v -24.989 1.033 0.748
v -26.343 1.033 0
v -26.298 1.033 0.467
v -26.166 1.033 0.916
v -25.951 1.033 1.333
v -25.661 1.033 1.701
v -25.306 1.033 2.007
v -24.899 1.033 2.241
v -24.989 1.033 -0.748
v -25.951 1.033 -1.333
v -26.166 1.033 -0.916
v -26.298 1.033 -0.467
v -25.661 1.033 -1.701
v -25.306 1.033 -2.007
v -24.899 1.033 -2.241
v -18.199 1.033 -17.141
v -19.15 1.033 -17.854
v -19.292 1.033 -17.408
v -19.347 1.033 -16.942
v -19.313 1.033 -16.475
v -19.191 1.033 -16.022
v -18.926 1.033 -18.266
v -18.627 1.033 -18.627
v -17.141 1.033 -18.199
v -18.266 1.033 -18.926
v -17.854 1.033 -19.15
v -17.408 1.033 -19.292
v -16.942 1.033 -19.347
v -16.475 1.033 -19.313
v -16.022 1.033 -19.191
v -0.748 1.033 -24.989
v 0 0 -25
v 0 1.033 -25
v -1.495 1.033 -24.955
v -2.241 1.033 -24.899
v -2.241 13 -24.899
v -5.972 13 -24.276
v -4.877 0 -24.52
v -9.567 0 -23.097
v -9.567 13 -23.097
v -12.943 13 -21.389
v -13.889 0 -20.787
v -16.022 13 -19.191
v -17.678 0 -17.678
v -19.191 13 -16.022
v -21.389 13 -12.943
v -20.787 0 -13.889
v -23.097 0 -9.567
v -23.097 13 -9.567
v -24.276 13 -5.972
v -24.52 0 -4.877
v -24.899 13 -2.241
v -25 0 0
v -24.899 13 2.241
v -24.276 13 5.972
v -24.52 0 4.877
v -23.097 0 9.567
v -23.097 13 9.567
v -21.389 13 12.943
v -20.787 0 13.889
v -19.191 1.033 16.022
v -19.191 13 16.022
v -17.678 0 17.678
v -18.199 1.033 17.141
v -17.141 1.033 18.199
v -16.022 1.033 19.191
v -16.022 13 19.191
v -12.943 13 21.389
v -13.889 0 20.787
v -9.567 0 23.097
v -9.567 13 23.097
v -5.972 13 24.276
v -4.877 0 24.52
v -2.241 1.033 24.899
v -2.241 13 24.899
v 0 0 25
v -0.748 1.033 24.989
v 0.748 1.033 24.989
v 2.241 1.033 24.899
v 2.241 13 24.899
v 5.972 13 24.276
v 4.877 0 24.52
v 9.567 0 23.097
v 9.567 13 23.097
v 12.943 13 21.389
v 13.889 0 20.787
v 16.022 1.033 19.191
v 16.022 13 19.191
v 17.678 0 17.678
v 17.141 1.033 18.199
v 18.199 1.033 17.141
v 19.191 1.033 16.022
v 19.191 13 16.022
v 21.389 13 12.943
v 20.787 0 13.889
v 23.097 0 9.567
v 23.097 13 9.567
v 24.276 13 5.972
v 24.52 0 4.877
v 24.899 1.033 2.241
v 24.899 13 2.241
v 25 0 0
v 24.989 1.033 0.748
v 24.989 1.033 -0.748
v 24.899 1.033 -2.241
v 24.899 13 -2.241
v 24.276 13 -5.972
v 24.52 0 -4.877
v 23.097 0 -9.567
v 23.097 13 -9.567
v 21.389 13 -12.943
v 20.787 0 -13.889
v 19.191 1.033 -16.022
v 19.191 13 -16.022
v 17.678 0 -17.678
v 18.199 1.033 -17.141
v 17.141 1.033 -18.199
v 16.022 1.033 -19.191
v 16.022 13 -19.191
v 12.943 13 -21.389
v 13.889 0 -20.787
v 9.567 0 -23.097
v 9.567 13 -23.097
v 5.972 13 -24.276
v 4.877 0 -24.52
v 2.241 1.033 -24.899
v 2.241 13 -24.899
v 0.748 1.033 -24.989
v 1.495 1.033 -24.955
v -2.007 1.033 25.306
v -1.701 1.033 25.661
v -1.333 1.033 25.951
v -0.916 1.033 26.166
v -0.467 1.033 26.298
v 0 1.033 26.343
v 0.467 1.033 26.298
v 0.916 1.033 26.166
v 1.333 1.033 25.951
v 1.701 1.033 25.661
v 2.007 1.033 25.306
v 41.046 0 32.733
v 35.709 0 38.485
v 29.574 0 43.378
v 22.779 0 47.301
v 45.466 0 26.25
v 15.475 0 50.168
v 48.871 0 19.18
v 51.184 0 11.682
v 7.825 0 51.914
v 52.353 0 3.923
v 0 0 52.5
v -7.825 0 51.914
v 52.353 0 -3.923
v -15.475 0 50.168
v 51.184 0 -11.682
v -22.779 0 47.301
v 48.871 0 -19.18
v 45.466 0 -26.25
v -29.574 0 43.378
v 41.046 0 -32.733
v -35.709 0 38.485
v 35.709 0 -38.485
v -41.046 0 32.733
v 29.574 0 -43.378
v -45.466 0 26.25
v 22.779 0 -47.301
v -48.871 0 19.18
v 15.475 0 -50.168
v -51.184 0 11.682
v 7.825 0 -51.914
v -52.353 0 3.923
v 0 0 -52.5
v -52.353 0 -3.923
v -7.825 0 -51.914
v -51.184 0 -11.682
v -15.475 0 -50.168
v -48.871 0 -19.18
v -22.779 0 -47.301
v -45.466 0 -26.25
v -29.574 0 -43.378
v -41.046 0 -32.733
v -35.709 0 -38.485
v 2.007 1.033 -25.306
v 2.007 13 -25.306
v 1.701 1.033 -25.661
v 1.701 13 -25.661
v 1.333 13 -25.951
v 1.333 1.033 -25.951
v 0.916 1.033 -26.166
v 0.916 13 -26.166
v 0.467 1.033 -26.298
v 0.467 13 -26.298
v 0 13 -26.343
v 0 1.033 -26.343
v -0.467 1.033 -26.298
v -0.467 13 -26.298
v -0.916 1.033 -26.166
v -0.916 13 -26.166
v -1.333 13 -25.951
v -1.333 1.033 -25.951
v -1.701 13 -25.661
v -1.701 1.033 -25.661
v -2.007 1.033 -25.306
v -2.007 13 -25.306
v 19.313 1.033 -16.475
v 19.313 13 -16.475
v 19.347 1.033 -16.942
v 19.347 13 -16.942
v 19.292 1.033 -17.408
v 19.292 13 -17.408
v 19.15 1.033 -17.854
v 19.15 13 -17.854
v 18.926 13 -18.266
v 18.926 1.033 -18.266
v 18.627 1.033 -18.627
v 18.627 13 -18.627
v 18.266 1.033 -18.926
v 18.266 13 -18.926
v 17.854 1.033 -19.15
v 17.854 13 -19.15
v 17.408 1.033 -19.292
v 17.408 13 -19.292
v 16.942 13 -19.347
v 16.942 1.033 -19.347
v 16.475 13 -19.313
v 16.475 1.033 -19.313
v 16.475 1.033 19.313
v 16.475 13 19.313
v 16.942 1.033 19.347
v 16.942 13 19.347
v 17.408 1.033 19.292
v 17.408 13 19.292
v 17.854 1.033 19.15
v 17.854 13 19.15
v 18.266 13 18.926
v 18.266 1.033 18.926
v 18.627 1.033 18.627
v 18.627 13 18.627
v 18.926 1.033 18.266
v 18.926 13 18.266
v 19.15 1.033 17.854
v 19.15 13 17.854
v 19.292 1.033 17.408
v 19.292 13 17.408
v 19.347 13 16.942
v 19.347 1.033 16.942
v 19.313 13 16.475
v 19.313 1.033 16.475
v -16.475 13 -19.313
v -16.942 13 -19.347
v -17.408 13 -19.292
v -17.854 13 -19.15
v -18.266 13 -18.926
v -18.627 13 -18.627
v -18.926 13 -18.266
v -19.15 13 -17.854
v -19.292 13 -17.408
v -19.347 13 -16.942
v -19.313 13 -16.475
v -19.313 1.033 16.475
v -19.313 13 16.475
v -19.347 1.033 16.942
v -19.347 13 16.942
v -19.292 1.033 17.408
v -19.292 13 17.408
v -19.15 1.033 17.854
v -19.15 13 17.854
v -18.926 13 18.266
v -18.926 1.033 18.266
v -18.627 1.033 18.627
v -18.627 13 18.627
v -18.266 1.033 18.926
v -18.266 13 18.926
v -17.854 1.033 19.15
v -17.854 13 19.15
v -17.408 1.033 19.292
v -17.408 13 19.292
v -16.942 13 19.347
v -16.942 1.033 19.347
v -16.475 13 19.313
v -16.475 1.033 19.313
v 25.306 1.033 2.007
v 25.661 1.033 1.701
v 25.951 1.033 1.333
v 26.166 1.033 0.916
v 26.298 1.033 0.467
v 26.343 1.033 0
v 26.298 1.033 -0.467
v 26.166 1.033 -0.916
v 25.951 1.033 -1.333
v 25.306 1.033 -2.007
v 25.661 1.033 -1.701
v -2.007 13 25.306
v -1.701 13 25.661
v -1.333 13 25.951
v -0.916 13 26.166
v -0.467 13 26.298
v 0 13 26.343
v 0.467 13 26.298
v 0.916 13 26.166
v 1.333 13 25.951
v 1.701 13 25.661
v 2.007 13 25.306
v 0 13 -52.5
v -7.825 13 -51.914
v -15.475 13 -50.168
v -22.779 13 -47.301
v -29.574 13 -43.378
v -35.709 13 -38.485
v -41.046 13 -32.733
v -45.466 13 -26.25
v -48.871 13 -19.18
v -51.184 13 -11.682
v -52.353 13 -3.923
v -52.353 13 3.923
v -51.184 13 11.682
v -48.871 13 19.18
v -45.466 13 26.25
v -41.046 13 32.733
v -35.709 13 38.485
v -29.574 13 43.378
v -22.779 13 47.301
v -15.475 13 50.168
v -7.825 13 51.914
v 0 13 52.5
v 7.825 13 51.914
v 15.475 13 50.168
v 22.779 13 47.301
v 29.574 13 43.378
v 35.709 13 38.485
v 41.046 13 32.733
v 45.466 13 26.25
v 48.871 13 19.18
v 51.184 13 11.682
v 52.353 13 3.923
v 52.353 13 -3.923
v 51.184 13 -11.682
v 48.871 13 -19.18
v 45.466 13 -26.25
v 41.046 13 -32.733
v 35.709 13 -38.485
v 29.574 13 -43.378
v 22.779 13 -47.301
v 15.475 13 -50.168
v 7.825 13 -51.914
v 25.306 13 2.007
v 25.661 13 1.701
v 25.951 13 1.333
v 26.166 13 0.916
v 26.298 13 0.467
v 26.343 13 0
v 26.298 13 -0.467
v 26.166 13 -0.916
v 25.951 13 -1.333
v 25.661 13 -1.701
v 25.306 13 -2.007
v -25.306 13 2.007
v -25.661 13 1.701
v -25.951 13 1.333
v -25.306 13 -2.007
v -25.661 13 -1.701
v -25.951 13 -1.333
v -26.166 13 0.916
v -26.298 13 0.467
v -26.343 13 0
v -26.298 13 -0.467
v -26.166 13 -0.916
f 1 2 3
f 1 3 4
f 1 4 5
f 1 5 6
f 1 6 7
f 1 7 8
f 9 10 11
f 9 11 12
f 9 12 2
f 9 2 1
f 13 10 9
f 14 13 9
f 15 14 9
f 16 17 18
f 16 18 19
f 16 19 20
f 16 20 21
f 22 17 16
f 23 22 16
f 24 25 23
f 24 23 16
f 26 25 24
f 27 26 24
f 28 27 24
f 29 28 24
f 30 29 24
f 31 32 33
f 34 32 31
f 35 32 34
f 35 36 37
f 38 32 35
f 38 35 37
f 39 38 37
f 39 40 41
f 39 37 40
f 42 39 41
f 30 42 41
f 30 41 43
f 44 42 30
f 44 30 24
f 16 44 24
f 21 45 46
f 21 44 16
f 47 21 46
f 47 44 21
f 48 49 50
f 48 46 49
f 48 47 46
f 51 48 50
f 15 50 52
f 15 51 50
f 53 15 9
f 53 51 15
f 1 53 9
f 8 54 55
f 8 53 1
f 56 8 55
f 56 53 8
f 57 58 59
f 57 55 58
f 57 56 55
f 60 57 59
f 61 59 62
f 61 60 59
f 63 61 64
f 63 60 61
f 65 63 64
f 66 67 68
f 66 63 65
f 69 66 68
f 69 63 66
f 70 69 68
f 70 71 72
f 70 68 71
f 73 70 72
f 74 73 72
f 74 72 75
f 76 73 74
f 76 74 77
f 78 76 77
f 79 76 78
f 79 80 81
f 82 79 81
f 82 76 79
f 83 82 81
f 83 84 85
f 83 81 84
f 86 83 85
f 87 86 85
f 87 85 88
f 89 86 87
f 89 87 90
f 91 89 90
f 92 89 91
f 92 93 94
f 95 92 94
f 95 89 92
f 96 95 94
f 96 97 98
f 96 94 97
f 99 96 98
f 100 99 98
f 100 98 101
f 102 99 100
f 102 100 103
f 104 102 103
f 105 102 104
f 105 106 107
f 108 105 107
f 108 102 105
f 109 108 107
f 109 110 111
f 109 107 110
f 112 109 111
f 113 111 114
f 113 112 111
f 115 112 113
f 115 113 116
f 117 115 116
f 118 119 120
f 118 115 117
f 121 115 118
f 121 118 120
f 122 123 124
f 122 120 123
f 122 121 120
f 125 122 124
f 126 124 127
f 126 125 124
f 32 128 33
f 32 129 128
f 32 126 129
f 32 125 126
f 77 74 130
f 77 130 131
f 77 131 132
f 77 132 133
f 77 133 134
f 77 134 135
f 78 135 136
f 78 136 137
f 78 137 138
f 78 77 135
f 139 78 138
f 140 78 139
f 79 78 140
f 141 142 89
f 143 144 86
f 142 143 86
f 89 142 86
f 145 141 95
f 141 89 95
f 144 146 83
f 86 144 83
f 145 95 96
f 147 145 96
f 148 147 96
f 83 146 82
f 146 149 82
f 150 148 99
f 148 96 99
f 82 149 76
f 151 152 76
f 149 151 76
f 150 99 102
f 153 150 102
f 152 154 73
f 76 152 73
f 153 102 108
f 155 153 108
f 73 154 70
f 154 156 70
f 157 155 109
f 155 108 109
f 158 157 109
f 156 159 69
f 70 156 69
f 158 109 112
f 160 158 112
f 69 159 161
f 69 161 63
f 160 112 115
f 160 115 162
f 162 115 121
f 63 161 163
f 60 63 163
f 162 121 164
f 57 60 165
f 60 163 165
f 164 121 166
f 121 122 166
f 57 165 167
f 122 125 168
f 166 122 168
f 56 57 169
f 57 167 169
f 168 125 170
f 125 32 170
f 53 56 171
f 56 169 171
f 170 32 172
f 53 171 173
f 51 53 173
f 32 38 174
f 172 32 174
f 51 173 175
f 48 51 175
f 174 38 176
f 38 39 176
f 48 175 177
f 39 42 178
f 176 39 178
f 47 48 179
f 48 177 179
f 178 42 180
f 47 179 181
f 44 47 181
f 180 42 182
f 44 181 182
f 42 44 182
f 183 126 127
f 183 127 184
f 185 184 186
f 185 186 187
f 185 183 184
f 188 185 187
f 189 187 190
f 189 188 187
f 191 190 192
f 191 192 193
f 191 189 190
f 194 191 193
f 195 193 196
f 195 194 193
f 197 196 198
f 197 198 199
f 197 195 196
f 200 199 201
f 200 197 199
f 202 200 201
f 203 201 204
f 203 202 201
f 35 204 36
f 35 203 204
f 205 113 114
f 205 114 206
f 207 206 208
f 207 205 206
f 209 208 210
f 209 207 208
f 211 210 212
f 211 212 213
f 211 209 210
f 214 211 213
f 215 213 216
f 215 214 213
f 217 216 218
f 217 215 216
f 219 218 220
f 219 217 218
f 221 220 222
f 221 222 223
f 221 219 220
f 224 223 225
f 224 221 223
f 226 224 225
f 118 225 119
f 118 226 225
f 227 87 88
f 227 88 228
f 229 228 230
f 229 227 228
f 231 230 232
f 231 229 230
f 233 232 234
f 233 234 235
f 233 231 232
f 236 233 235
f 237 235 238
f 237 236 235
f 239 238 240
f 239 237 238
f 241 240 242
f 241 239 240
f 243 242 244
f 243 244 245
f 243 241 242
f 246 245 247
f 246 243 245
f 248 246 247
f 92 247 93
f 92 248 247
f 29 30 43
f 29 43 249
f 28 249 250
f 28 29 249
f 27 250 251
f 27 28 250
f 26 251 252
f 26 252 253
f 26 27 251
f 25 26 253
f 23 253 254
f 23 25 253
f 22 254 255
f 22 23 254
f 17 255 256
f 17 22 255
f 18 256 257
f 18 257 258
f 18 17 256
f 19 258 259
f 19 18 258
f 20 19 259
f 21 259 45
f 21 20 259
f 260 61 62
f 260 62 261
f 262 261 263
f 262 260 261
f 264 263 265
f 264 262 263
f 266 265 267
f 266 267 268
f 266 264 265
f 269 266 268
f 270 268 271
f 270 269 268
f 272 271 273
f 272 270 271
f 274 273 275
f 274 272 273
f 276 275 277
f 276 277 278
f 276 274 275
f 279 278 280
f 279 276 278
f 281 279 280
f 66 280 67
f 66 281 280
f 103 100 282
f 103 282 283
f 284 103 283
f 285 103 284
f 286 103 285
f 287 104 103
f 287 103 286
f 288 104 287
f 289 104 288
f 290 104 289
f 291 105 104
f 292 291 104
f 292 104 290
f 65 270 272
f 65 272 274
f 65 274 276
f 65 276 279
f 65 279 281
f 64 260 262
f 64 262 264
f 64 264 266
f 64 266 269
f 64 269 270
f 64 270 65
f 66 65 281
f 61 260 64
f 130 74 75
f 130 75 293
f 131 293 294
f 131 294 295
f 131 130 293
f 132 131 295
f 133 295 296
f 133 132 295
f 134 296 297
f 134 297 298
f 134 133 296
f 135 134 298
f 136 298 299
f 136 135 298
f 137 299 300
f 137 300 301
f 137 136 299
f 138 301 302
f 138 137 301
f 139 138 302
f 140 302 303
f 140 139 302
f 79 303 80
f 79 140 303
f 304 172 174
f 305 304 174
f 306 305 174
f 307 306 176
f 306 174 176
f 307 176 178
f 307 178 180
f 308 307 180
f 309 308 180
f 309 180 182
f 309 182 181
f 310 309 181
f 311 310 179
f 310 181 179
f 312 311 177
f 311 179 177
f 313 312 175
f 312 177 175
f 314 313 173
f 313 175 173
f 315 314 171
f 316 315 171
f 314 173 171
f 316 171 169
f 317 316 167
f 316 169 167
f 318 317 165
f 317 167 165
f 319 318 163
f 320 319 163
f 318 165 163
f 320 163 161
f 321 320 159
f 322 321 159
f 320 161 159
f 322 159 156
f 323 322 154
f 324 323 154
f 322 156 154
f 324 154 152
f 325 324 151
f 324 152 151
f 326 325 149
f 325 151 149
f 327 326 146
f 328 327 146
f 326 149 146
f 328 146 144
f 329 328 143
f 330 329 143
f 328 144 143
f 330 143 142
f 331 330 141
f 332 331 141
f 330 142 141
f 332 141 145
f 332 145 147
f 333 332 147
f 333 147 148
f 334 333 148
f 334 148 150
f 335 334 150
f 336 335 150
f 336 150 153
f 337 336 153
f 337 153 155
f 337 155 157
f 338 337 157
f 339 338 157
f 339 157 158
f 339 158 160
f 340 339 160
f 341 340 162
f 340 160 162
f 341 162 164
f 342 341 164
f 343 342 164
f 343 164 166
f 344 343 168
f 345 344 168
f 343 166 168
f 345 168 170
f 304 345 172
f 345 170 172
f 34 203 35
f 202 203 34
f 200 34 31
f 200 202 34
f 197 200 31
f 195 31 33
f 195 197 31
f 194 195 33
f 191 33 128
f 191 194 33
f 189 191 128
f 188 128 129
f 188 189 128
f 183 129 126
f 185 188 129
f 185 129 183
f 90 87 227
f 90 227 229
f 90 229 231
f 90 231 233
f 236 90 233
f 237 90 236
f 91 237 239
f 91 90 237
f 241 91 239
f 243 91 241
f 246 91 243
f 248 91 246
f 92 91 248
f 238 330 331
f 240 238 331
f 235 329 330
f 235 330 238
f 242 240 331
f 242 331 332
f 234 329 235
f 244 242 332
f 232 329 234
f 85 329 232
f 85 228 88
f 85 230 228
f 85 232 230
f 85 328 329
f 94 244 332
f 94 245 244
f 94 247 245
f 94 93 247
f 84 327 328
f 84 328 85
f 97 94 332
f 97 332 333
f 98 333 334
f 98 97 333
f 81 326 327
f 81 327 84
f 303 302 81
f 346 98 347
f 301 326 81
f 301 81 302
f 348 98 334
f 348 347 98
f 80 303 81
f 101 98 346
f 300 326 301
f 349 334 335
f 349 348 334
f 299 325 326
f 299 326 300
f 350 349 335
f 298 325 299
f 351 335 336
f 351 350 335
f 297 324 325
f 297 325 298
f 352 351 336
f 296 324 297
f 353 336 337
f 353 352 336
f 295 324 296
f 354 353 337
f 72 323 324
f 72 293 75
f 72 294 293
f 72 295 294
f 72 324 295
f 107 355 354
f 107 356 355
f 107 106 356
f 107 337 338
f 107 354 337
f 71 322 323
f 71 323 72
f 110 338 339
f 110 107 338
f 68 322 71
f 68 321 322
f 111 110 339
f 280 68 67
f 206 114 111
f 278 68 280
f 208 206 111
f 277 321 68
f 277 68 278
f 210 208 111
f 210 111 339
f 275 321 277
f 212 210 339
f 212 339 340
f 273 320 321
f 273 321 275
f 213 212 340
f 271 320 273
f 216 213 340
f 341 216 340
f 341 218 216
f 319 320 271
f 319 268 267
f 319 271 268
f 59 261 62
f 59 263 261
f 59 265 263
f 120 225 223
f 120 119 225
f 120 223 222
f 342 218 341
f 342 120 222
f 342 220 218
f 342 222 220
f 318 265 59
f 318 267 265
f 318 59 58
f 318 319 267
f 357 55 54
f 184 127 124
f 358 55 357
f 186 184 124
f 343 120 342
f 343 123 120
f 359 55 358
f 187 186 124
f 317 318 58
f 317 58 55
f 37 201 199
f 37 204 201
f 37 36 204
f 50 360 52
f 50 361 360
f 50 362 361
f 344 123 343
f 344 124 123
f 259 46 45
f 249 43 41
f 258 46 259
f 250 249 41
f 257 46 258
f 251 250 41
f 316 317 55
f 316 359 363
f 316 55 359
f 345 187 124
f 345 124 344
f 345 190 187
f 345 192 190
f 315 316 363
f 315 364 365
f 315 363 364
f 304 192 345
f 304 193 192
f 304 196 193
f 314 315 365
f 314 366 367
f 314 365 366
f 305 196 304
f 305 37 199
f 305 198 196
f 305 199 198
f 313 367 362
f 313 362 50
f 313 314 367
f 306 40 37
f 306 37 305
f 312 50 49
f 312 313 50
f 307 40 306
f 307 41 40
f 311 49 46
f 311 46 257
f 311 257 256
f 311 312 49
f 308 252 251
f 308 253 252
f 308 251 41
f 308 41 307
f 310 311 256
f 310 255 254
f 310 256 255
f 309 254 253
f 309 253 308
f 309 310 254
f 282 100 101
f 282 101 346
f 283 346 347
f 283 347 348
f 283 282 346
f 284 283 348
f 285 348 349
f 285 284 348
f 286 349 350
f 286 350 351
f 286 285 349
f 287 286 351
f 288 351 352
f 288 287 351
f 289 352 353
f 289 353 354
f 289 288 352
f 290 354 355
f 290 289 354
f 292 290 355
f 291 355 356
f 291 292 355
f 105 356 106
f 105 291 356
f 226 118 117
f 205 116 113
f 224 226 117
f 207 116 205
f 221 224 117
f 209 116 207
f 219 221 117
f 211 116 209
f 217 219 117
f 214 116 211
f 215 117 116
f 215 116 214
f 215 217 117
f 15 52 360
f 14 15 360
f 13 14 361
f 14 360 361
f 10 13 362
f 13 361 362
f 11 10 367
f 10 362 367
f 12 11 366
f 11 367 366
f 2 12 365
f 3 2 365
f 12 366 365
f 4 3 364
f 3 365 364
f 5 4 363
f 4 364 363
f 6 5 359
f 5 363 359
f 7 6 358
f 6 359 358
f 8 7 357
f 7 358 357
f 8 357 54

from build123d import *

# Parameters (mm, degrees)
SKETCH1_R           = 52.5
BOSS_EXTRUDE1_DEPTH = 13
SKETCH2_R           = 25
CUT_EXTRUDE1_DEPTH  = 76.375725535
SKETCH3_R           = 2.460552854
CUT_EXTRUDE2_DEPTH  = 11.967461035
CIRPATTERN1_COUNT   = 8


with BuildPart() as part:
    # Sketch1 → Boss-Extrude1 (new body)
    with BuildSketch(Plane(origin=(0, 0, 0), x_dir=(1, 0, 0), z_dir=(0, 1, 0))):
        Circle(SKETCH1_R)
    extrude(amount=BOSS_EXTRUDE1_DEPTH)

    # Sketch2 → Cut-Extrude1 (cut, through all)
    with BuildSketch(Plane(origin=(0, 0, 0), x_dir=(1, 0, 0), z_dir=(0, 1, 0))):
        Circle(SKETCH2_R)
    extrude(amount=CUT_EXTRUDE1_DEPTH, mode=Mode.SUBTRACT)

    # Sketch3 → Cut-Extrude2 (cut)
    with BuildSketch(Plane(origin=(0, 13, 0), x_dir=(1, 0, 0), z_dir=(0, 1, 0))):
        with Locations((-23.882542415, 0)):
            Circle(SKETCH3_R)
    cut_extrude2 = extrude(amount=-CUT_EXTRUDE2_DEPTH, mode=Mode.SUBTRACT)

    # CirPattern1: Cut-Extrude2 ×8 about axis
    cirpattern1_axis = Axis((0, 0, 0), (0, 1, 0))
    for i in range(1, CIRPATTERN1_COUNT):
        add(cut_extrude2.rotate(cirpattern1_axis, i * 360 / CIRPATTERN1_COUNT), mode=Mode.SUBTRACT)


solid = part.part
